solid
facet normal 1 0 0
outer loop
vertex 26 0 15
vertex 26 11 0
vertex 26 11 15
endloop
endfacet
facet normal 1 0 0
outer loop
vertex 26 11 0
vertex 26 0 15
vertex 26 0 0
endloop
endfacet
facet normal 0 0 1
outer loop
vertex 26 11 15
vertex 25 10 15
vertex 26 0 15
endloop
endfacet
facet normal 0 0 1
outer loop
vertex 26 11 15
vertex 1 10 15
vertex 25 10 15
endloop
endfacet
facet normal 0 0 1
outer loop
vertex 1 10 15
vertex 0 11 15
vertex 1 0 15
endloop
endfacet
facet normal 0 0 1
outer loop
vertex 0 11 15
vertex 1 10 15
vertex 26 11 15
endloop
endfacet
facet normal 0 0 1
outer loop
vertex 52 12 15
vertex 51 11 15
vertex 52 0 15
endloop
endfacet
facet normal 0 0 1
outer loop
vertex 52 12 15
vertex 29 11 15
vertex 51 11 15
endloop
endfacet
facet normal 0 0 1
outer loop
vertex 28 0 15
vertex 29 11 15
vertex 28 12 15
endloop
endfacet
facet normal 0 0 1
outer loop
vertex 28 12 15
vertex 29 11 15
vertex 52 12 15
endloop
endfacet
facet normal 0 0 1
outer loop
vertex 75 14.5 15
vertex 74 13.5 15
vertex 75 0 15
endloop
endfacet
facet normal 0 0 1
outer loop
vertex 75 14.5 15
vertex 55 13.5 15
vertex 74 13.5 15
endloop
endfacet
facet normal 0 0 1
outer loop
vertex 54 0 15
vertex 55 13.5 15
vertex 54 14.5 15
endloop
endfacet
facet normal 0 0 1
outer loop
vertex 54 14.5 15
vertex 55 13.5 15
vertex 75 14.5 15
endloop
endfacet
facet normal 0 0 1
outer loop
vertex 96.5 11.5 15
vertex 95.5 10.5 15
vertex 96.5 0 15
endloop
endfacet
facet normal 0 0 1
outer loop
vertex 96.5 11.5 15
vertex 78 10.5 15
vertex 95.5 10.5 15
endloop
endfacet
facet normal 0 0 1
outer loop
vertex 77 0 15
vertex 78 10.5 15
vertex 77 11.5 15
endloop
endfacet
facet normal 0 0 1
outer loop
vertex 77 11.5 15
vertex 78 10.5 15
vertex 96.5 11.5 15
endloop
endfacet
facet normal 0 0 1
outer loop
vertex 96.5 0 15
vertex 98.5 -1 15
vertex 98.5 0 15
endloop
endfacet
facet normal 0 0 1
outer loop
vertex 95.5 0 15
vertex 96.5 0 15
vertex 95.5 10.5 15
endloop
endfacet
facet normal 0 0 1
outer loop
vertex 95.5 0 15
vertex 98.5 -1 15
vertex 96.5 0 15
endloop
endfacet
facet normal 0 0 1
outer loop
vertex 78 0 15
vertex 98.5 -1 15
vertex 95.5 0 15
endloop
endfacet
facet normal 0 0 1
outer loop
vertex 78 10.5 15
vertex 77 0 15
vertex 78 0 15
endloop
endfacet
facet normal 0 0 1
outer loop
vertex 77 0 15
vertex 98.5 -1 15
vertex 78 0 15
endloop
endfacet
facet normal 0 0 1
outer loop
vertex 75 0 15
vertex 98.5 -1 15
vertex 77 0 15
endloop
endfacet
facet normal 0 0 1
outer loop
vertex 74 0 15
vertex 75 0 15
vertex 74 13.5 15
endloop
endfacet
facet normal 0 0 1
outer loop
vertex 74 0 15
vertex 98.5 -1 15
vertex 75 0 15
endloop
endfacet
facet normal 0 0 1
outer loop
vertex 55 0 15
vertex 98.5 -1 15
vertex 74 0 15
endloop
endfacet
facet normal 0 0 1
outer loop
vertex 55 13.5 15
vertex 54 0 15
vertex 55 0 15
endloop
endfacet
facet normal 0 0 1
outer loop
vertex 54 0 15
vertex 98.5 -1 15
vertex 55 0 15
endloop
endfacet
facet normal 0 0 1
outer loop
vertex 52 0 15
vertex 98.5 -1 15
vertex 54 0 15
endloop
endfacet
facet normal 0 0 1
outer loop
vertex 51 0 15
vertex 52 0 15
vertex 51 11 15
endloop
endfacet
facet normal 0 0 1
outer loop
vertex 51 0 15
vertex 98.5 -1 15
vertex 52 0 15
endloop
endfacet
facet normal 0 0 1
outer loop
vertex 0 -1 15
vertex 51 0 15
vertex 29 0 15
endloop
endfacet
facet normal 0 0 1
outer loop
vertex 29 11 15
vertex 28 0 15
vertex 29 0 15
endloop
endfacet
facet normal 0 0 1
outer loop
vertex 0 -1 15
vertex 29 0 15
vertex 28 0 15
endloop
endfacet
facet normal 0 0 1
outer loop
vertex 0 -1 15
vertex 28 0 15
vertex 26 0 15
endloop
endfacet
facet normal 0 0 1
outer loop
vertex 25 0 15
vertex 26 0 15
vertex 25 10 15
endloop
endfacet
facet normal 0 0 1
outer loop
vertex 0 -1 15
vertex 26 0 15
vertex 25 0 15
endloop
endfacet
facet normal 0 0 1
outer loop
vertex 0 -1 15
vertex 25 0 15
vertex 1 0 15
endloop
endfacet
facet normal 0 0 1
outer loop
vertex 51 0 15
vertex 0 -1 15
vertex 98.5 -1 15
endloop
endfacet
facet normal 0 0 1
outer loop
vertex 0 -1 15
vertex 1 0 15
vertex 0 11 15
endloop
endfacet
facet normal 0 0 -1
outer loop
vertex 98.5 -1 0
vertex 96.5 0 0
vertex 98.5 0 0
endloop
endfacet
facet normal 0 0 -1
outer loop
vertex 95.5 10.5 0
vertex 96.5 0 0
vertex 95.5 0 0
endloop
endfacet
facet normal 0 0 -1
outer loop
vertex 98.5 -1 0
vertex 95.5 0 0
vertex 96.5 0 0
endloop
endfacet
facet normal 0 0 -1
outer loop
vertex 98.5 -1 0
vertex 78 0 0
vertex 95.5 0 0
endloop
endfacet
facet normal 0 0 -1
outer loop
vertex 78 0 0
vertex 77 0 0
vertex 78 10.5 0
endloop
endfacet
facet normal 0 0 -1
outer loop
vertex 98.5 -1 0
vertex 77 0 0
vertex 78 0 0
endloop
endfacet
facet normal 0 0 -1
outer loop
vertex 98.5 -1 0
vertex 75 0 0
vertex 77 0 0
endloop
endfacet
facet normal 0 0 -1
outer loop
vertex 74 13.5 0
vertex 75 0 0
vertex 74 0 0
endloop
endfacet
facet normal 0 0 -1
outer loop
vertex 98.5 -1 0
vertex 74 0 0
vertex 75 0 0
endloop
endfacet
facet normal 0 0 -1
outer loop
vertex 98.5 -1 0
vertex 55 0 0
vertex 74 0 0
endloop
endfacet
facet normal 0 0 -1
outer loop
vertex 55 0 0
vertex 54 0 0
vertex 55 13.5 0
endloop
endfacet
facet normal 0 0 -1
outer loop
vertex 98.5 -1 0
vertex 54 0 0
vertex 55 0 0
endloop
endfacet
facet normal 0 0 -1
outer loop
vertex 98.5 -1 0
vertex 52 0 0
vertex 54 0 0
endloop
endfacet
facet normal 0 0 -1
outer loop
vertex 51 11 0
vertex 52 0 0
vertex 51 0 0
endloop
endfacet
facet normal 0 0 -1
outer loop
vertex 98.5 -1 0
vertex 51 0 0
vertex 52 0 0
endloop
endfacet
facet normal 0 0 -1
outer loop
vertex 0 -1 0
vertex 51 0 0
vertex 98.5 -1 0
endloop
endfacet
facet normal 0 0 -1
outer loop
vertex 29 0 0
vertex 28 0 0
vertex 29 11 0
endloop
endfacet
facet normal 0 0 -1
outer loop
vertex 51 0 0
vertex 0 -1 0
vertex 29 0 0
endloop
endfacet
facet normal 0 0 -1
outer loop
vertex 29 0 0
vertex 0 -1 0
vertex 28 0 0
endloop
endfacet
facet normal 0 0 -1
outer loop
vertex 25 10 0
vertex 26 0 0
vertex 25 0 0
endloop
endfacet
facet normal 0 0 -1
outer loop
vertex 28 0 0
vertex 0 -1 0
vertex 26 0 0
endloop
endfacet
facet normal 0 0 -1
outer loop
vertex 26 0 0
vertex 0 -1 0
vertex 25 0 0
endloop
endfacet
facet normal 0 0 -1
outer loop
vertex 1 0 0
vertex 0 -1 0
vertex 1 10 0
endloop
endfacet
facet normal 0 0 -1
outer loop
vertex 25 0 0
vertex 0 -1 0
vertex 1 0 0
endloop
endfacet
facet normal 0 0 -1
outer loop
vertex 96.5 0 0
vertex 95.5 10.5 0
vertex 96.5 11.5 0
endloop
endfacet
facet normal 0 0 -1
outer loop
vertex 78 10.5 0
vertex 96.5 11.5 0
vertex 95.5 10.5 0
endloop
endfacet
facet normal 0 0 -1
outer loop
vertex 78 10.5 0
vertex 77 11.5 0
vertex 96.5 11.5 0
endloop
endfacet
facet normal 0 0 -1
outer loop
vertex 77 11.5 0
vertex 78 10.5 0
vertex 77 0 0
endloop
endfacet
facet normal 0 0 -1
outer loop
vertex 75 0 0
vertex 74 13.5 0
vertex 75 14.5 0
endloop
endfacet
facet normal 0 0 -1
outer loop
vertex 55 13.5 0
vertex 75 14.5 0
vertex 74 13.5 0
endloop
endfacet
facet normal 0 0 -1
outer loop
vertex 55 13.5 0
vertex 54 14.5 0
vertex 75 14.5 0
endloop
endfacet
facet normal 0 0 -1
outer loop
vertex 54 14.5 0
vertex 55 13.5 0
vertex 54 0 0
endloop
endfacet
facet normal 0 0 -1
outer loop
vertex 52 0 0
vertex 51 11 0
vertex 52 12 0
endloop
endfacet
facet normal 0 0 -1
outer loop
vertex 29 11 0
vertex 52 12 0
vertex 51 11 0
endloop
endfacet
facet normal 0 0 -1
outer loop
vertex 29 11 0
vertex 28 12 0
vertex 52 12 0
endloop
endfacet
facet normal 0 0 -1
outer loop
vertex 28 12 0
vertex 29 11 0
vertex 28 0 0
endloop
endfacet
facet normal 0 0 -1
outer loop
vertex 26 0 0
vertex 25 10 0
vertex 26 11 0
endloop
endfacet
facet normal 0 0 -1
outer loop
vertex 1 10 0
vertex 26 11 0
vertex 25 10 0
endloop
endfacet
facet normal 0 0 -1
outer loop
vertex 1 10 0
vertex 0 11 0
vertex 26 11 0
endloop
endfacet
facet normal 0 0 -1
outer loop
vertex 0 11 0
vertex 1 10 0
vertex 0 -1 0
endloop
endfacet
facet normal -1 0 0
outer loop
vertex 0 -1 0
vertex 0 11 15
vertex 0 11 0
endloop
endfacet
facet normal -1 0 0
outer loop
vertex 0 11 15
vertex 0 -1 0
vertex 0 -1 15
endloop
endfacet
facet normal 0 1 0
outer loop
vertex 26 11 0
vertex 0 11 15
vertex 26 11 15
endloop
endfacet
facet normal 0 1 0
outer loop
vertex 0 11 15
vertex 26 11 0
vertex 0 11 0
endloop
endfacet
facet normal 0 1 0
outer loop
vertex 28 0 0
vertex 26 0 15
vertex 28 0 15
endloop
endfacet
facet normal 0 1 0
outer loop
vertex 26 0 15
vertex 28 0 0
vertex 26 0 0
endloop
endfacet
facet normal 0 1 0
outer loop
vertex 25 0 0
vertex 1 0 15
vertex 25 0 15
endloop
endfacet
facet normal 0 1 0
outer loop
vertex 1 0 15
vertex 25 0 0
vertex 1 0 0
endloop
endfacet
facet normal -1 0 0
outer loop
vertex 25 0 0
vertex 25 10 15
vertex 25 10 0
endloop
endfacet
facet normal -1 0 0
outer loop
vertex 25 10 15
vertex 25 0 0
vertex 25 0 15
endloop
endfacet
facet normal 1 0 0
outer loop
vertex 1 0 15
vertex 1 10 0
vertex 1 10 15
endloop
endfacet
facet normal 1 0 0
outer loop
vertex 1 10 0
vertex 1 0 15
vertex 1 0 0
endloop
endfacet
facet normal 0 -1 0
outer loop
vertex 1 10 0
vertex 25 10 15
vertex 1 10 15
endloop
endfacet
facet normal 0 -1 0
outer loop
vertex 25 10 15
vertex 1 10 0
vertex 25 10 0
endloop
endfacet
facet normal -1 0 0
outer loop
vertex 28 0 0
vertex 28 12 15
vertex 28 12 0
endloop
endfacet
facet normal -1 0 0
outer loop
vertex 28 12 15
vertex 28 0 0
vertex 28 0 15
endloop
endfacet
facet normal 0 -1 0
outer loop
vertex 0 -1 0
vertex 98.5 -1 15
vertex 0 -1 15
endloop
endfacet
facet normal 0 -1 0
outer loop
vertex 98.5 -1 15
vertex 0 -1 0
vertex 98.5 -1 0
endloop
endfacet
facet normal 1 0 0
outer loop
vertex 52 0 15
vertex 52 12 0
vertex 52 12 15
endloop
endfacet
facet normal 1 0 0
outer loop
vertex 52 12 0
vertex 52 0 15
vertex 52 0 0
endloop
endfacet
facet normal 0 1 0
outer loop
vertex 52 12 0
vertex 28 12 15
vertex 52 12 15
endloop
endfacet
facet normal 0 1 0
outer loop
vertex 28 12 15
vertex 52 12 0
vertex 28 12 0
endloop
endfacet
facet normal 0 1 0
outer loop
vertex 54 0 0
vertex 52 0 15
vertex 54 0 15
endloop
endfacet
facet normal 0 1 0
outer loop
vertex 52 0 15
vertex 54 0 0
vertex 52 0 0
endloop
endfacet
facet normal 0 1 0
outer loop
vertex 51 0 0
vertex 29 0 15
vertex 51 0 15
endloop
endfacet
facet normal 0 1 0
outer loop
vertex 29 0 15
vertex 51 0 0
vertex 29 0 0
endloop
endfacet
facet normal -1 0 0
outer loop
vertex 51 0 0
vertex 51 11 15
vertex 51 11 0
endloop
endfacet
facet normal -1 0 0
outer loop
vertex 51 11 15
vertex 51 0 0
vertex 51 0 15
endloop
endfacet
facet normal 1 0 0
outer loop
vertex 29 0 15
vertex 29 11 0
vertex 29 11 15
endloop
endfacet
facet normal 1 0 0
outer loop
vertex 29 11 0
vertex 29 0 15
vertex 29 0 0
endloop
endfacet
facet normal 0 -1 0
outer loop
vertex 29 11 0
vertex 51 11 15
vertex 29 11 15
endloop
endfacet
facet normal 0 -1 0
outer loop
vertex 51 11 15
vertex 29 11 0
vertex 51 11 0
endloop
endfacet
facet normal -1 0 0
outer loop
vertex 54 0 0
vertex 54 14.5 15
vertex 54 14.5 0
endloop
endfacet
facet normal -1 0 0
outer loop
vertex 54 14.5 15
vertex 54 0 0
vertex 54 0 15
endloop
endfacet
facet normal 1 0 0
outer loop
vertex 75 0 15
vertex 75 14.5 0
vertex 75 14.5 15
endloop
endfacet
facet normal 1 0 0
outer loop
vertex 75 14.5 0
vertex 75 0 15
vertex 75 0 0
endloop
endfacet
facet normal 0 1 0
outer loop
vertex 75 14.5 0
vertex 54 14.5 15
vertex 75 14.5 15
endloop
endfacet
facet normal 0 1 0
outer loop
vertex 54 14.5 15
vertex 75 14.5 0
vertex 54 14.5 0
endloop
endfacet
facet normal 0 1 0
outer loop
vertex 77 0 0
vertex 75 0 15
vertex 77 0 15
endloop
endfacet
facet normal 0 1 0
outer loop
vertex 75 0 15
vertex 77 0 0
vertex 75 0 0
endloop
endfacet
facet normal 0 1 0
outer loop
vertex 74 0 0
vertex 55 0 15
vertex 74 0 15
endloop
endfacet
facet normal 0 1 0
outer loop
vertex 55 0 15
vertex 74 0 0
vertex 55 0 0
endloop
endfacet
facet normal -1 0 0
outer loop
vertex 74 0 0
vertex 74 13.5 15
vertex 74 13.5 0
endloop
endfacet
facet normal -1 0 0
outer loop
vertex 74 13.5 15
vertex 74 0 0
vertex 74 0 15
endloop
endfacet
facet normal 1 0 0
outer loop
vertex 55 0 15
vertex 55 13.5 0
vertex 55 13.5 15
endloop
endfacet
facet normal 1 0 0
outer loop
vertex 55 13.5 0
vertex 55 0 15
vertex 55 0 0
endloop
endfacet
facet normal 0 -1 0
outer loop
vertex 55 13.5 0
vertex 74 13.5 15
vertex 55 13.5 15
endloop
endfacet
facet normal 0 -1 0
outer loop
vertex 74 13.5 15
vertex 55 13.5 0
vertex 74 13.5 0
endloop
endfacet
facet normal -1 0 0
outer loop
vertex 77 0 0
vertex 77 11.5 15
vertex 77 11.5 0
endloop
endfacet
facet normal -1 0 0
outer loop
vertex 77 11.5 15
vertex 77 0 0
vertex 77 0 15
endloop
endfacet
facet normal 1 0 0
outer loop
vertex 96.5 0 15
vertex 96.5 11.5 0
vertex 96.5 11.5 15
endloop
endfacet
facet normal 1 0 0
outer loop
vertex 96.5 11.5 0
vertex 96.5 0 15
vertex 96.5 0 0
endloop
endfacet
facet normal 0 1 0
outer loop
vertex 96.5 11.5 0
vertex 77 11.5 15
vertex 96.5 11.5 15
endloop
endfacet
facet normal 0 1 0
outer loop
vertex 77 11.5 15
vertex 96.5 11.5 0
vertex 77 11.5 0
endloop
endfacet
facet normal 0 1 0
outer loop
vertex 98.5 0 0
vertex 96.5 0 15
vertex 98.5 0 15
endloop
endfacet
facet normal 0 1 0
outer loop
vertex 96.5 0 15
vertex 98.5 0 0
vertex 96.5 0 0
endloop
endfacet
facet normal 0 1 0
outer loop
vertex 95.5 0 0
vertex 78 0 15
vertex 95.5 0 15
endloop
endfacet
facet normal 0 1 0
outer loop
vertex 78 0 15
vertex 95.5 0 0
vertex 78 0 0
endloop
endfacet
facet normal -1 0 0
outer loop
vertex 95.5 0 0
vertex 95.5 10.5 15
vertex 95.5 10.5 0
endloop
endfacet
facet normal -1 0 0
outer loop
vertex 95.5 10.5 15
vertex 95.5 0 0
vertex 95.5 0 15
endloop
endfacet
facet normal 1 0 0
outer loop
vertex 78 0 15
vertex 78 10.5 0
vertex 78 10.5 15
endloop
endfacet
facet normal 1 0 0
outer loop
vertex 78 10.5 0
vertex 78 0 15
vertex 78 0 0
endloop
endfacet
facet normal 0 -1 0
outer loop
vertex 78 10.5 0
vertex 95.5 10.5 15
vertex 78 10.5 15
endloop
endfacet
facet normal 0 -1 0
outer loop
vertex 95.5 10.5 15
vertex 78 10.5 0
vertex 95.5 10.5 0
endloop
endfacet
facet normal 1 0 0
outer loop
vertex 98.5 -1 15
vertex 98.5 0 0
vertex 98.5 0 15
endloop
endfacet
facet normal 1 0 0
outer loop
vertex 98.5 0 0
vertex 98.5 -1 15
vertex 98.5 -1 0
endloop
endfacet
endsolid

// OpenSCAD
// Pocket organizer

slots = [[24, 10], [22, 11], [19, 13.5], [17.5, 10.5]];
h = 15;
wall = 1;
extra_space = 2;
base = 1;

module slot_generator(offset=0, i=0) {
      echo(offset, i);
      s = slots[i];
      inner = [s.x, s.y, h];
      outer = [s.x+2*wall, s.y+wall, h];
      translate([offset, 0, 0]) {
        translate([0, -base, 0]) cube([outer.x+extra_space, base, h]);  
        difference(){
          cube(outer);
          translate([wall, 0, 0]) cube(inner);
        }
      }
      if (i < len(slots)-1) {
          o2 = offset + s.x + 2*wall + extra_space;
          slot_generator(o2, i+1);
      }
  }
 
  slot_generator();
